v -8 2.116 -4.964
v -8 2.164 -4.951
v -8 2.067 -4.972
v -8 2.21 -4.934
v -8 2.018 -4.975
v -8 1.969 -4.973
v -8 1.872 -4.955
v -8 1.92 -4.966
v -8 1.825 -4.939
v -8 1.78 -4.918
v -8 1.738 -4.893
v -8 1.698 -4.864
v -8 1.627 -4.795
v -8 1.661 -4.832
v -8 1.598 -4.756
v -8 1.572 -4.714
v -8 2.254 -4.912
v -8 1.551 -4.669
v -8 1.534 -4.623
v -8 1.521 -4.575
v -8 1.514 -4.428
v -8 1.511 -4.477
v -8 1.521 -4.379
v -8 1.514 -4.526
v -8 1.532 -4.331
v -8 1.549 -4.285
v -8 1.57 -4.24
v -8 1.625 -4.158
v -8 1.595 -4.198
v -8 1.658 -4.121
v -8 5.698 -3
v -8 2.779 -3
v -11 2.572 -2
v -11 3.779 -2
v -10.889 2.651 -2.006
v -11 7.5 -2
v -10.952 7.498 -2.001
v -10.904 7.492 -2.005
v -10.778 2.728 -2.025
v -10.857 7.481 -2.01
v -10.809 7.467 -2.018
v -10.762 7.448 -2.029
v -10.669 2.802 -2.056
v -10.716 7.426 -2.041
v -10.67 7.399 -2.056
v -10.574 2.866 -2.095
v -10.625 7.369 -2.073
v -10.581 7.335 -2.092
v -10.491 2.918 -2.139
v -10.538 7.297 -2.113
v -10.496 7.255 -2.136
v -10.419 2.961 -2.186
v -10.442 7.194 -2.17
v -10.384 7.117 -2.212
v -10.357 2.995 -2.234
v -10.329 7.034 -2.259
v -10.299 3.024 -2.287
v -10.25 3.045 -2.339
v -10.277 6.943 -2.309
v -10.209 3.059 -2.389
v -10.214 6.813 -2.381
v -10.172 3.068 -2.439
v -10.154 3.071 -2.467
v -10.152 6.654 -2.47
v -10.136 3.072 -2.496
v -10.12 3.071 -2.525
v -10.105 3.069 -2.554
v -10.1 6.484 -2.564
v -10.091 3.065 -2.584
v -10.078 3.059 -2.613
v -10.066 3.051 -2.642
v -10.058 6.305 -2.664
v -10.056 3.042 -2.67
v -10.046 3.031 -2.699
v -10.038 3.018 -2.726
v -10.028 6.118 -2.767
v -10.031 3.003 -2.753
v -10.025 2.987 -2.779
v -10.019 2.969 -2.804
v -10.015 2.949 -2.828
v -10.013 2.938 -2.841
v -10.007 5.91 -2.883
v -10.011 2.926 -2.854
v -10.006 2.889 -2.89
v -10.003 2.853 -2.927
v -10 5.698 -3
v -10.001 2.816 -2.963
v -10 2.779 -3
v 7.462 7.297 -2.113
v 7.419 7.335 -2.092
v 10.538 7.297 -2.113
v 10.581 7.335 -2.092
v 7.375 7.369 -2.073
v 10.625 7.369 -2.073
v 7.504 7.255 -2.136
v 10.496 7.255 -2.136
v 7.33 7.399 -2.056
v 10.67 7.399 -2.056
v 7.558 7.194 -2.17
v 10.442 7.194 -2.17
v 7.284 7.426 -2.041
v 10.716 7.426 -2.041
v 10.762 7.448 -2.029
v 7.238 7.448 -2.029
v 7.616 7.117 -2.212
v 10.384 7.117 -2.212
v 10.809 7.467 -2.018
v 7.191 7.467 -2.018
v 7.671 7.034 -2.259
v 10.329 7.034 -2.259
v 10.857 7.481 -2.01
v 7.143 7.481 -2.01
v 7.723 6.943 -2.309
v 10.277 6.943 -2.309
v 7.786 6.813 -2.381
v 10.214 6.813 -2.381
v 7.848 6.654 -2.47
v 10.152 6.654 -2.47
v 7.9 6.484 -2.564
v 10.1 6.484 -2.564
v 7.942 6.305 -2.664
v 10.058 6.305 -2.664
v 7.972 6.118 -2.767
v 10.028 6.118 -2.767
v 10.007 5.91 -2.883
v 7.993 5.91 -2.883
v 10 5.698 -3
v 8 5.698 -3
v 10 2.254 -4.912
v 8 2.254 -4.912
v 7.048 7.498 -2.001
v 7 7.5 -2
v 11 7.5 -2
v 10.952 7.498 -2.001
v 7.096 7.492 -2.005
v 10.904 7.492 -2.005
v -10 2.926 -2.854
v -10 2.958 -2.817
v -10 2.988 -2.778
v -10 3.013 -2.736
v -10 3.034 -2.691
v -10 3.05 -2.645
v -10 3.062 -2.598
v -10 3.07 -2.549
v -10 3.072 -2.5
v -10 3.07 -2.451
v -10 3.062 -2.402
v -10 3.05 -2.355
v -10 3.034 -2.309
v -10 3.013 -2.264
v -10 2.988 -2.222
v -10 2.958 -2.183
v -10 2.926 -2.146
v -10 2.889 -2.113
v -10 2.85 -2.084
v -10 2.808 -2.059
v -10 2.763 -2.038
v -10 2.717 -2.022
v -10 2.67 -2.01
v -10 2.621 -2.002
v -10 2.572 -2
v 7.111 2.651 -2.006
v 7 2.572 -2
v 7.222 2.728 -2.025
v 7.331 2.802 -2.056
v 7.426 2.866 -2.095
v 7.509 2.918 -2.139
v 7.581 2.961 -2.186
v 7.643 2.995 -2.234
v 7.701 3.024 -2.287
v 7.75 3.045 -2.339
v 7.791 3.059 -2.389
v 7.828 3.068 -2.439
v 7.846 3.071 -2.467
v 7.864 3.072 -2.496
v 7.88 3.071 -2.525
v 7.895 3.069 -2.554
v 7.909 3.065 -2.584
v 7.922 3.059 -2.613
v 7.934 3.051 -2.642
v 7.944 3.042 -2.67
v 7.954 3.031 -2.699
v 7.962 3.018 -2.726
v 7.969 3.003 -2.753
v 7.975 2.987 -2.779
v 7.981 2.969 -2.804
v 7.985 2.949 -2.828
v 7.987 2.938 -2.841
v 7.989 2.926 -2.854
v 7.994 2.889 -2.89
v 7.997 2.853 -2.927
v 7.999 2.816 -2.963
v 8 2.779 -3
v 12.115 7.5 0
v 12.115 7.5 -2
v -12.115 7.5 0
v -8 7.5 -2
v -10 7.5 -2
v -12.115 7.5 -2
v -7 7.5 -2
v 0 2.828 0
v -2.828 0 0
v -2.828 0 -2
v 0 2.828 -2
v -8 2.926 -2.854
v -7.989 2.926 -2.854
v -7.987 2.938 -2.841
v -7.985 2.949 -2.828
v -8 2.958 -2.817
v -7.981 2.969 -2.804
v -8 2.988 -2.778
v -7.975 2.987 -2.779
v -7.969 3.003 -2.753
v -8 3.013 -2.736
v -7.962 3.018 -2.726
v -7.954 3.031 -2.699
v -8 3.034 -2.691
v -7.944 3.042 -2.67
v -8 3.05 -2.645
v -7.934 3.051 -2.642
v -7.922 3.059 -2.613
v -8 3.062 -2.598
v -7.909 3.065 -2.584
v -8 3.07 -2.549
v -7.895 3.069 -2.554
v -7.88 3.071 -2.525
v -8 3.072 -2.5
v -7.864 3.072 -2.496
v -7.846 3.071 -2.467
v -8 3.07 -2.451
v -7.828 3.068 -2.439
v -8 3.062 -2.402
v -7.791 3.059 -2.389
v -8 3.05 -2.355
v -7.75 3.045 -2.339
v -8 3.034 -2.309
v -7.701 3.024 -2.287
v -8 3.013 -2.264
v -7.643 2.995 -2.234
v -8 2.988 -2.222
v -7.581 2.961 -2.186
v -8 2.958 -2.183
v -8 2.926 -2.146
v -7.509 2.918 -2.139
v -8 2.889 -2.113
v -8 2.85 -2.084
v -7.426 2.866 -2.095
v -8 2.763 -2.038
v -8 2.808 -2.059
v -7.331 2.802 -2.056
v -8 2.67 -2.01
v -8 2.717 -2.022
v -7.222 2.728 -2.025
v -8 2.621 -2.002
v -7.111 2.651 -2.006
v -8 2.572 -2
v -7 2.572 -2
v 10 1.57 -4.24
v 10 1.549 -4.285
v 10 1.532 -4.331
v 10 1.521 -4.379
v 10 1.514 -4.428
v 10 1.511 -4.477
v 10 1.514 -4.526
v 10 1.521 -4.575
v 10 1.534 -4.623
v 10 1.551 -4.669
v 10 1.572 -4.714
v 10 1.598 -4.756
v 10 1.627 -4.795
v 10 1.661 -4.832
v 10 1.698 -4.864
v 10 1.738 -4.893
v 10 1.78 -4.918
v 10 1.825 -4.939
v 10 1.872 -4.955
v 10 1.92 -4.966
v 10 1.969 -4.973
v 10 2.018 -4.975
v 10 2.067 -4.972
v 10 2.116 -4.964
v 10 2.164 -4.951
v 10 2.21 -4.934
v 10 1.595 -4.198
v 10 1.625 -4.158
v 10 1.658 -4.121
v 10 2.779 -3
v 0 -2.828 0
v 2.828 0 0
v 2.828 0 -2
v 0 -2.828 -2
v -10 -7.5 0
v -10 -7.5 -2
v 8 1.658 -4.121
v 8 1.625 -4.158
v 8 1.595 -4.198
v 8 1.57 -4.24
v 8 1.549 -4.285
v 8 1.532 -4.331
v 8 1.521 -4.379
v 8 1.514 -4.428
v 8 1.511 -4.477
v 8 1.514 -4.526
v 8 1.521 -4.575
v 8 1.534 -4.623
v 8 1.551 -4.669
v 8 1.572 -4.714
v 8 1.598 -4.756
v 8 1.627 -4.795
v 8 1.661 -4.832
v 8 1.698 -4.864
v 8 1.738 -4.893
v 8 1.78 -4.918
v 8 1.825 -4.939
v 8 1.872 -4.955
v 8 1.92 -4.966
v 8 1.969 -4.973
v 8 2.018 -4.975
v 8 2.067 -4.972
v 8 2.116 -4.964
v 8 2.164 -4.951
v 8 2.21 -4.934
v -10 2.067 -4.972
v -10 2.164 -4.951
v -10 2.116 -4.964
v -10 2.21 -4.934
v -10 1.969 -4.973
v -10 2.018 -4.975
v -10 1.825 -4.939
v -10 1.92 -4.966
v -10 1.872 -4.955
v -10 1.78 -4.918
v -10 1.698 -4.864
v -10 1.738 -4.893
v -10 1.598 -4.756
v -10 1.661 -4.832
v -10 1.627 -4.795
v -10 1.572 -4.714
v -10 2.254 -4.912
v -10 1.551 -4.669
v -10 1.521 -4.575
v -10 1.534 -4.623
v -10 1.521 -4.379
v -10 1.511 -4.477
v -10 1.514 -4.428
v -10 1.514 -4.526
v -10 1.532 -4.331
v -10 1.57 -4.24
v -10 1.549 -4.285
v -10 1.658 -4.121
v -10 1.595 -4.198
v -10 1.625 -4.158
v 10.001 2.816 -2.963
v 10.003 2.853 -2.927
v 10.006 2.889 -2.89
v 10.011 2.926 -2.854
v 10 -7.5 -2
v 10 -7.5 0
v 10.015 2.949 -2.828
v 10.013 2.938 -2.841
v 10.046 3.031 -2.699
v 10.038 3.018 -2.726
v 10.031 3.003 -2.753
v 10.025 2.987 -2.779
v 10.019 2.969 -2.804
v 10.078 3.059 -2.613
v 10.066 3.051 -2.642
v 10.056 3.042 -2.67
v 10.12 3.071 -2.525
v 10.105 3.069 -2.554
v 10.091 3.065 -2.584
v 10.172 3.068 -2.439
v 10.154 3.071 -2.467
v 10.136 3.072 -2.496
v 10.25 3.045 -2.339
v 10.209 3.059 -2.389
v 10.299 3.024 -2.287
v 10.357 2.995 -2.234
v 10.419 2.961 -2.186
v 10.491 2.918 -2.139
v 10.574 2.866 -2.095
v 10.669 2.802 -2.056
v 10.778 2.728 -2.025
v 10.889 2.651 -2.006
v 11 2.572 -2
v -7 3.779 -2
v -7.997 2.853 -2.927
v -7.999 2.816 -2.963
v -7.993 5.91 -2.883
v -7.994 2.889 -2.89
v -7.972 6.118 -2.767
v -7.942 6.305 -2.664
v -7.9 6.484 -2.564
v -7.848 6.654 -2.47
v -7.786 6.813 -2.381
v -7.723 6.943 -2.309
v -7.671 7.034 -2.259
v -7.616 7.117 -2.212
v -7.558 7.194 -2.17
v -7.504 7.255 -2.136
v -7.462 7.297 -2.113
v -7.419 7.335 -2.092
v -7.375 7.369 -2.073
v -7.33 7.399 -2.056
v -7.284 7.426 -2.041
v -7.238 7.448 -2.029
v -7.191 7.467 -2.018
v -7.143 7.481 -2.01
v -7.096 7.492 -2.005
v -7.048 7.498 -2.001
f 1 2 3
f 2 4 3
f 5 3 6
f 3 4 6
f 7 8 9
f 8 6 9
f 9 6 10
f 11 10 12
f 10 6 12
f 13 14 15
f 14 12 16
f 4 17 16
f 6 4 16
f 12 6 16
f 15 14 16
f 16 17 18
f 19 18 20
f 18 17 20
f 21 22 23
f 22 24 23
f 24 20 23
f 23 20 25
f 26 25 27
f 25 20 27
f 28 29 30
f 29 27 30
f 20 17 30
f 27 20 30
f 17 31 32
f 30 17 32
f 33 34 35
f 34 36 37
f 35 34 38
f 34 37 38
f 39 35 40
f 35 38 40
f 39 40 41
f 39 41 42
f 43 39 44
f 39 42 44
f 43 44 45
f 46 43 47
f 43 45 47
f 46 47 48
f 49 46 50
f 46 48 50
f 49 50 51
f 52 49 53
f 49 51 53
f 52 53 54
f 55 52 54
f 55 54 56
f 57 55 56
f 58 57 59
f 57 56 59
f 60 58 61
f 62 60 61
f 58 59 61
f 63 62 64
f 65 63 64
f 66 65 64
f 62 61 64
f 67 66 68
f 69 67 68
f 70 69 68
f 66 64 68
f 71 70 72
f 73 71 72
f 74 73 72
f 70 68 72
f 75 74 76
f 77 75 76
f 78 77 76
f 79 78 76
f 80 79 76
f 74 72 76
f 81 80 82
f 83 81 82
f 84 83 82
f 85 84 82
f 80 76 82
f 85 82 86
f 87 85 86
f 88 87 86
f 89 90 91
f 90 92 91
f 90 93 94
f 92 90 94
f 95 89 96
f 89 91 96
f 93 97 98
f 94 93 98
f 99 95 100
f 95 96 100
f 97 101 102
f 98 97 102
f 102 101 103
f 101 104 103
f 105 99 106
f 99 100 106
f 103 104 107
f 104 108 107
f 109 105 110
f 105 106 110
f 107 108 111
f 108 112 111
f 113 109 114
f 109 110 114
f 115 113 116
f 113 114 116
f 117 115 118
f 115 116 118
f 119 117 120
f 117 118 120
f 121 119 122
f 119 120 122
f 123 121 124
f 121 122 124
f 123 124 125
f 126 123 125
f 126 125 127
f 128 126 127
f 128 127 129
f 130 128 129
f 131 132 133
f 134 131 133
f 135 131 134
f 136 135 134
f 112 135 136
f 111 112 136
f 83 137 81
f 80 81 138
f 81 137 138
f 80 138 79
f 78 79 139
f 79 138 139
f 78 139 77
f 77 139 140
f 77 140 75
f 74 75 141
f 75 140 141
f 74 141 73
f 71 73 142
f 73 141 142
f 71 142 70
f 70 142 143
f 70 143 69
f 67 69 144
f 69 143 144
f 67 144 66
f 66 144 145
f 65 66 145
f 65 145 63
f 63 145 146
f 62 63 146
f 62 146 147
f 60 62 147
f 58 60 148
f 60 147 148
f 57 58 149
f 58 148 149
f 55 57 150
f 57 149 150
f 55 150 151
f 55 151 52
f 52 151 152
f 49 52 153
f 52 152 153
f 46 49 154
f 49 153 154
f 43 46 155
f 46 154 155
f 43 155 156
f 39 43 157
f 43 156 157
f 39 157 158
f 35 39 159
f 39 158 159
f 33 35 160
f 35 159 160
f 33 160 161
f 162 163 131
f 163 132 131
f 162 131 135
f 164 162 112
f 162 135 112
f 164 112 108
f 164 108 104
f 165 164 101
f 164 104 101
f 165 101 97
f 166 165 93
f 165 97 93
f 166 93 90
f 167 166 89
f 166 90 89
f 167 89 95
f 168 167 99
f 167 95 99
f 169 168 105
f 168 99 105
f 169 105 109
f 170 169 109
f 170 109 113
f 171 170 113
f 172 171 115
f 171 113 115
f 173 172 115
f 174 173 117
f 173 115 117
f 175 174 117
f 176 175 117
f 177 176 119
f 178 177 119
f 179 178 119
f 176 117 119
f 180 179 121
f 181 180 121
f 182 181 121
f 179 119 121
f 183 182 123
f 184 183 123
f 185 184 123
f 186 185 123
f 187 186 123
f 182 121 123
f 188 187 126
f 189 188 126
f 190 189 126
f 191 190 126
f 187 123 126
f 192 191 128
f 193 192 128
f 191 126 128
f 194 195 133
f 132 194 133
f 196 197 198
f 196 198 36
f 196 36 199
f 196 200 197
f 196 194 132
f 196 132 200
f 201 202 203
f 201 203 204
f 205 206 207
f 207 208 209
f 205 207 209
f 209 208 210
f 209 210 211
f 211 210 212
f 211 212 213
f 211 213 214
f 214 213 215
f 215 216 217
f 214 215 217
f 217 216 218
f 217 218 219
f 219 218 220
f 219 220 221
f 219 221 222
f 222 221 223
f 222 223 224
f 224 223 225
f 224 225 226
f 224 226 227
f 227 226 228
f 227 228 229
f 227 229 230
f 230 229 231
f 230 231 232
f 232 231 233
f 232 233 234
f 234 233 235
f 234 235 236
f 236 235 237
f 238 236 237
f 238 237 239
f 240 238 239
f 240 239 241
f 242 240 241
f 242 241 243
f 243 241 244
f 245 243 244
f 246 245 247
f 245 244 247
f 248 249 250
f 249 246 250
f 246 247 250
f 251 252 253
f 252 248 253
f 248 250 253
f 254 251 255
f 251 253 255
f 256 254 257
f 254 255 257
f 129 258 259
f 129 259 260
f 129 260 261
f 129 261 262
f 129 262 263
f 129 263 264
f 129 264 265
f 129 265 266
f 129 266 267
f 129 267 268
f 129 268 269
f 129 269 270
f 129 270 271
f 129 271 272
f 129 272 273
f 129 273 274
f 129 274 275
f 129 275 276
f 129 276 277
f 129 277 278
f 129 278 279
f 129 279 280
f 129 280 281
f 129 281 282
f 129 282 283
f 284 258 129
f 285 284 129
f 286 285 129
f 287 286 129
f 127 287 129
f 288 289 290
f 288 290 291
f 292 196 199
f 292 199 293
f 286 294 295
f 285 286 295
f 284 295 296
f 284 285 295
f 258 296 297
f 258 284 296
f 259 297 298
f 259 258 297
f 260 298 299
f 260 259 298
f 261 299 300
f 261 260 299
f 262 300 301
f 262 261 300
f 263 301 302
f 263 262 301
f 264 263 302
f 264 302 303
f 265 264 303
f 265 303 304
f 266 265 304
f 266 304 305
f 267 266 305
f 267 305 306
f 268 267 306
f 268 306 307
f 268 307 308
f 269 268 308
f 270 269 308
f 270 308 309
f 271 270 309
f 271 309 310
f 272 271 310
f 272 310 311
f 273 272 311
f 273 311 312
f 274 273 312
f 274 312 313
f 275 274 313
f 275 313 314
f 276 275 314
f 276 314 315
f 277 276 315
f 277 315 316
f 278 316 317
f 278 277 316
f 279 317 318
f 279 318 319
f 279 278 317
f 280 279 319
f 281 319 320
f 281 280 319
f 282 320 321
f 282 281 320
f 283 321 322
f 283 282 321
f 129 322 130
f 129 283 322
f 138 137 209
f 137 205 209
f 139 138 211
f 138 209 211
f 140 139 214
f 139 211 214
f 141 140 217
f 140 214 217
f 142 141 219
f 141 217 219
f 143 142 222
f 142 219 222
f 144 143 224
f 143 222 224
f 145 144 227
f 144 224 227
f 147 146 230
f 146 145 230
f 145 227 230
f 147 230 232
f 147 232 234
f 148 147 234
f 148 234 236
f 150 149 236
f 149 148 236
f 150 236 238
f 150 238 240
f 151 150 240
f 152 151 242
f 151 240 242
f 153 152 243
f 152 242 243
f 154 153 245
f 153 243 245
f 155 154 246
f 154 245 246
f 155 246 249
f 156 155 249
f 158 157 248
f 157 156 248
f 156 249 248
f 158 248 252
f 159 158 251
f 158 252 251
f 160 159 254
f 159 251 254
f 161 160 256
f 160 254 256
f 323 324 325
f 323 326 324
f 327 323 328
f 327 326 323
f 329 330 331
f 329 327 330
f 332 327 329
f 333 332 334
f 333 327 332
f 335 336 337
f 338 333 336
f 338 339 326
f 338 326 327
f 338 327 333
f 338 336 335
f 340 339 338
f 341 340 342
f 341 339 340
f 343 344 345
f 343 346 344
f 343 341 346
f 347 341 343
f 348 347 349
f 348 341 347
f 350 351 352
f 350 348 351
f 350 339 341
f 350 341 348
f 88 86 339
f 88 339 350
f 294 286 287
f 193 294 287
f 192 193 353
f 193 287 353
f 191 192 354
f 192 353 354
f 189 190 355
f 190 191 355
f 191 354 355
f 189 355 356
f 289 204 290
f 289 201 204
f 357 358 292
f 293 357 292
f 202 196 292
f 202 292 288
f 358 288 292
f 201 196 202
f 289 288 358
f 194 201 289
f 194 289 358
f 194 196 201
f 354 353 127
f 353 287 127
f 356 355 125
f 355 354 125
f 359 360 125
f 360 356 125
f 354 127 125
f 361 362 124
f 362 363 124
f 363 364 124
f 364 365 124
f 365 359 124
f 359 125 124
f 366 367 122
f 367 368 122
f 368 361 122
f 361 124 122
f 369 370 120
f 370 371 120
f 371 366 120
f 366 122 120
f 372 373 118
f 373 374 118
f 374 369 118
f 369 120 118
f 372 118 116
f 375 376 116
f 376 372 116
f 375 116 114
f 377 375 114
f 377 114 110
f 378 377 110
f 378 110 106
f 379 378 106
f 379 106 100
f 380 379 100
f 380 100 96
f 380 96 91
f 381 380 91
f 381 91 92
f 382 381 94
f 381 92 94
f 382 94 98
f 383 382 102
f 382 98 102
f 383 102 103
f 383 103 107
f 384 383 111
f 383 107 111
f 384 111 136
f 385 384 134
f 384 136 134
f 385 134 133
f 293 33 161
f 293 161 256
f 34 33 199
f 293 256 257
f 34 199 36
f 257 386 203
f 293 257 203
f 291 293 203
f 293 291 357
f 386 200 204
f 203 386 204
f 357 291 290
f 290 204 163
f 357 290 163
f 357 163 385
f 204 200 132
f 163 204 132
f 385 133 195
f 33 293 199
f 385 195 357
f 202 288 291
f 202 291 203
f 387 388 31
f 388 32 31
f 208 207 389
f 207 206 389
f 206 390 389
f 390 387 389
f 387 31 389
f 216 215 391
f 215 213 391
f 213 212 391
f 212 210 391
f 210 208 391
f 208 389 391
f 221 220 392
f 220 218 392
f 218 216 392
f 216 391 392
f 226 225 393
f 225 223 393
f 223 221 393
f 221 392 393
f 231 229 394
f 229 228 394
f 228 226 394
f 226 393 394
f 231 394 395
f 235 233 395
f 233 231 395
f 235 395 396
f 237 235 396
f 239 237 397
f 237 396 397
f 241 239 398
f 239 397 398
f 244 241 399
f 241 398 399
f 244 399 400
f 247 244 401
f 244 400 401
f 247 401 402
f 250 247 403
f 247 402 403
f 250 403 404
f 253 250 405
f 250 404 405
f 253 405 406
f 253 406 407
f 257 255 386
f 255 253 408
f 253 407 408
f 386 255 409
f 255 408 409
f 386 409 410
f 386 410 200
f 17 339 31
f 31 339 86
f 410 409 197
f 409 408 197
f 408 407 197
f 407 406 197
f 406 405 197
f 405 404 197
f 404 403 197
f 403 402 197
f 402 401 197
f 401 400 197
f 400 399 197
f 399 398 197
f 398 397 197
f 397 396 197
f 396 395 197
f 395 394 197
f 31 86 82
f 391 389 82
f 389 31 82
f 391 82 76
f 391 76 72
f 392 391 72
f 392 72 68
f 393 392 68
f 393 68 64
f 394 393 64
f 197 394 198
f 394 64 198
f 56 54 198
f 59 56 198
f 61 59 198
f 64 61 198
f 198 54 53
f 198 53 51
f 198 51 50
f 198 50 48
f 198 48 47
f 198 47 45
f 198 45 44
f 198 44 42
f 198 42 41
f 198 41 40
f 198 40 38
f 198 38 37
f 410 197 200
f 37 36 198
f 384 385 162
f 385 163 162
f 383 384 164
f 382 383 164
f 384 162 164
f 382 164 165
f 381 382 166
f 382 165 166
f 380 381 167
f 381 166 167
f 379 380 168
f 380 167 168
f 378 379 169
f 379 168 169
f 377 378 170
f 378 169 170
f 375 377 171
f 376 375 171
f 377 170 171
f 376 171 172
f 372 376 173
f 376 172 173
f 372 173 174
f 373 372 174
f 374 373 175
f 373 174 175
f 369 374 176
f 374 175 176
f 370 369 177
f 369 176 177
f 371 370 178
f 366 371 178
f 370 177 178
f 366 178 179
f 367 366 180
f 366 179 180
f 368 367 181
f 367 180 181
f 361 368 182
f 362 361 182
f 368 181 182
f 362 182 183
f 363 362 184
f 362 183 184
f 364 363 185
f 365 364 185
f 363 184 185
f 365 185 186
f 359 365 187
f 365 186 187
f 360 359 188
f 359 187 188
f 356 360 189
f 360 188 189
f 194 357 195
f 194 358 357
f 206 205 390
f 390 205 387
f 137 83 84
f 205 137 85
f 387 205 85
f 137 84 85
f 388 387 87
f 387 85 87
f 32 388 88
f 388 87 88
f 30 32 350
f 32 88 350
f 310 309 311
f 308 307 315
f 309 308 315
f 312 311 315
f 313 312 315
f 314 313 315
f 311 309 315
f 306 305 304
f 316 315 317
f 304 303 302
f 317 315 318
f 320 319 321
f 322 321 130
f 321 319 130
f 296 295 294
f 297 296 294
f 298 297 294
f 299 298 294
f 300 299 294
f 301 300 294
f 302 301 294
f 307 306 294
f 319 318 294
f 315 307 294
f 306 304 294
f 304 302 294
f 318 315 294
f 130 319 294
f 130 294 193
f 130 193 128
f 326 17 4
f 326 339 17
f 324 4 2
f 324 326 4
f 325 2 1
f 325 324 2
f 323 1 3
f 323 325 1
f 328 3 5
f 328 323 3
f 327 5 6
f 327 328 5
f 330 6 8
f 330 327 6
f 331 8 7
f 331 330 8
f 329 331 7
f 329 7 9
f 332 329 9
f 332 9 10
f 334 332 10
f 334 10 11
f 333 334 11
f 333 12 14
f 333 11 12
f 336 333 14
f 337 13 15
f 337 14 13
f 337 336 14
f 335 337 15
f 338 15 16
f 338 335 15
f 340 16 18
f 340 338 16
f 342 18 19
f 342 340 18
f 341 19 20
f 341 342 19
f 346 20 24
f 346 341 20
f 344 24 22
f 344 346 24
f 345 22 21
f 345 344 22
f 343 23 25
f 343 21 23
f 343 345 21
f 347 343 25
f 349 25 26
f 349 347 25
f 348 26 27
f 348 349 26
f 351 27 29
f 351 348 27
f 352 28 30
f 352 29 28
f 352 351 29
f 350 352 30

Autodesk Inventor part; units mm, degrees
ref_plane "XZ Plane" through (0, 0, 0) normal (0, 1, 0) x (-1, 0, 0)
ref_plane "XY Plane" through (0, 0, 0) normal (0, 0, 1) x (1, 0, 0)
sketch "スケッチ1" plane through (0, 0, 0) normal (0, 0, 1) x (1, 0, 0)
  line L0 (2.8284, 0) -> (0, -2.8284)
  line L1 (0, -2.8284) -> (-2.8284, 0)
  line L2 (-2.8284, 0) -> (0, 2.8284)
  line L3 (0, 2.8284) -> (2.8284, 0)
  line L4 (-12.1149, 7.5) -> (-10, -7.5)
  line L5 (10, -7.5) -> (-10, -7.5)
  line L6 (10, -7.5) -> (12.1149, 7.5)
  line L7 (12.1149, 7.5) -> (-12.1149, 7.5)
  point P0 (0, 0)
  point P1 (0, 7.5)
  point P2 (11.0574, 0)
  dimension "d10" = 24.2298
  dimension "d11" = 20
  dimension "d12" = 15
  dimension "d13" = 4
extrude "押し出し1" add sketch "スケッチ1" against normal blind 2
ref_plane "作業平面1" through (10, 0, 0) normal (1, 0, 0) x (0, 1, 0)
sketch "スケッチ3" plane through (10, 0, 0) normal (1, 0, 0) x (0, 1, 0)
  line L0 (7.5, 0) -> (-7.5, 0) projected
  line L1 (7.5, 0) -> (7.5, -2) projected
  line L2 (-7.5, -2) -> (7.5, -2) projected
  line L3 (-7.5, 0) -> (-7.5, -2) projected
  line L4 (7.5, -2) -> (2.254, -4.912)
  line L5 (1.6578, -4.1213) -> (3.7791, -2)
  arc A0 (1.6578, -4.1213) -> (2.254, -4.912) centre (2.0114, -4.4749) ccw
  point P0 (0, 0)
  dimension "d17" = 0.5
  dimension "d18" = 45
  dimension "d19" = 6
  dimension "d25" = 3
extrude "押し出し3" add sketch "スケッチ3" against normal blind 2 contours L4 A0 L5 L2
fillet "フィレット1" radius 1 2 edges at (10, 5.6396, -2) (8, 5.6396, -2)
fillet "フィレット2" radius 0.5 2 edges at (7.5, 3.7791, -2) (10.5, 3.7791, -2)
mirror "ミラー2" about plane through (0, 0, 0) normal (1, 0, 0) of "押し出し3", "フィレット1", "フィレット2"
properties part number "om_BackHolder_V4"
